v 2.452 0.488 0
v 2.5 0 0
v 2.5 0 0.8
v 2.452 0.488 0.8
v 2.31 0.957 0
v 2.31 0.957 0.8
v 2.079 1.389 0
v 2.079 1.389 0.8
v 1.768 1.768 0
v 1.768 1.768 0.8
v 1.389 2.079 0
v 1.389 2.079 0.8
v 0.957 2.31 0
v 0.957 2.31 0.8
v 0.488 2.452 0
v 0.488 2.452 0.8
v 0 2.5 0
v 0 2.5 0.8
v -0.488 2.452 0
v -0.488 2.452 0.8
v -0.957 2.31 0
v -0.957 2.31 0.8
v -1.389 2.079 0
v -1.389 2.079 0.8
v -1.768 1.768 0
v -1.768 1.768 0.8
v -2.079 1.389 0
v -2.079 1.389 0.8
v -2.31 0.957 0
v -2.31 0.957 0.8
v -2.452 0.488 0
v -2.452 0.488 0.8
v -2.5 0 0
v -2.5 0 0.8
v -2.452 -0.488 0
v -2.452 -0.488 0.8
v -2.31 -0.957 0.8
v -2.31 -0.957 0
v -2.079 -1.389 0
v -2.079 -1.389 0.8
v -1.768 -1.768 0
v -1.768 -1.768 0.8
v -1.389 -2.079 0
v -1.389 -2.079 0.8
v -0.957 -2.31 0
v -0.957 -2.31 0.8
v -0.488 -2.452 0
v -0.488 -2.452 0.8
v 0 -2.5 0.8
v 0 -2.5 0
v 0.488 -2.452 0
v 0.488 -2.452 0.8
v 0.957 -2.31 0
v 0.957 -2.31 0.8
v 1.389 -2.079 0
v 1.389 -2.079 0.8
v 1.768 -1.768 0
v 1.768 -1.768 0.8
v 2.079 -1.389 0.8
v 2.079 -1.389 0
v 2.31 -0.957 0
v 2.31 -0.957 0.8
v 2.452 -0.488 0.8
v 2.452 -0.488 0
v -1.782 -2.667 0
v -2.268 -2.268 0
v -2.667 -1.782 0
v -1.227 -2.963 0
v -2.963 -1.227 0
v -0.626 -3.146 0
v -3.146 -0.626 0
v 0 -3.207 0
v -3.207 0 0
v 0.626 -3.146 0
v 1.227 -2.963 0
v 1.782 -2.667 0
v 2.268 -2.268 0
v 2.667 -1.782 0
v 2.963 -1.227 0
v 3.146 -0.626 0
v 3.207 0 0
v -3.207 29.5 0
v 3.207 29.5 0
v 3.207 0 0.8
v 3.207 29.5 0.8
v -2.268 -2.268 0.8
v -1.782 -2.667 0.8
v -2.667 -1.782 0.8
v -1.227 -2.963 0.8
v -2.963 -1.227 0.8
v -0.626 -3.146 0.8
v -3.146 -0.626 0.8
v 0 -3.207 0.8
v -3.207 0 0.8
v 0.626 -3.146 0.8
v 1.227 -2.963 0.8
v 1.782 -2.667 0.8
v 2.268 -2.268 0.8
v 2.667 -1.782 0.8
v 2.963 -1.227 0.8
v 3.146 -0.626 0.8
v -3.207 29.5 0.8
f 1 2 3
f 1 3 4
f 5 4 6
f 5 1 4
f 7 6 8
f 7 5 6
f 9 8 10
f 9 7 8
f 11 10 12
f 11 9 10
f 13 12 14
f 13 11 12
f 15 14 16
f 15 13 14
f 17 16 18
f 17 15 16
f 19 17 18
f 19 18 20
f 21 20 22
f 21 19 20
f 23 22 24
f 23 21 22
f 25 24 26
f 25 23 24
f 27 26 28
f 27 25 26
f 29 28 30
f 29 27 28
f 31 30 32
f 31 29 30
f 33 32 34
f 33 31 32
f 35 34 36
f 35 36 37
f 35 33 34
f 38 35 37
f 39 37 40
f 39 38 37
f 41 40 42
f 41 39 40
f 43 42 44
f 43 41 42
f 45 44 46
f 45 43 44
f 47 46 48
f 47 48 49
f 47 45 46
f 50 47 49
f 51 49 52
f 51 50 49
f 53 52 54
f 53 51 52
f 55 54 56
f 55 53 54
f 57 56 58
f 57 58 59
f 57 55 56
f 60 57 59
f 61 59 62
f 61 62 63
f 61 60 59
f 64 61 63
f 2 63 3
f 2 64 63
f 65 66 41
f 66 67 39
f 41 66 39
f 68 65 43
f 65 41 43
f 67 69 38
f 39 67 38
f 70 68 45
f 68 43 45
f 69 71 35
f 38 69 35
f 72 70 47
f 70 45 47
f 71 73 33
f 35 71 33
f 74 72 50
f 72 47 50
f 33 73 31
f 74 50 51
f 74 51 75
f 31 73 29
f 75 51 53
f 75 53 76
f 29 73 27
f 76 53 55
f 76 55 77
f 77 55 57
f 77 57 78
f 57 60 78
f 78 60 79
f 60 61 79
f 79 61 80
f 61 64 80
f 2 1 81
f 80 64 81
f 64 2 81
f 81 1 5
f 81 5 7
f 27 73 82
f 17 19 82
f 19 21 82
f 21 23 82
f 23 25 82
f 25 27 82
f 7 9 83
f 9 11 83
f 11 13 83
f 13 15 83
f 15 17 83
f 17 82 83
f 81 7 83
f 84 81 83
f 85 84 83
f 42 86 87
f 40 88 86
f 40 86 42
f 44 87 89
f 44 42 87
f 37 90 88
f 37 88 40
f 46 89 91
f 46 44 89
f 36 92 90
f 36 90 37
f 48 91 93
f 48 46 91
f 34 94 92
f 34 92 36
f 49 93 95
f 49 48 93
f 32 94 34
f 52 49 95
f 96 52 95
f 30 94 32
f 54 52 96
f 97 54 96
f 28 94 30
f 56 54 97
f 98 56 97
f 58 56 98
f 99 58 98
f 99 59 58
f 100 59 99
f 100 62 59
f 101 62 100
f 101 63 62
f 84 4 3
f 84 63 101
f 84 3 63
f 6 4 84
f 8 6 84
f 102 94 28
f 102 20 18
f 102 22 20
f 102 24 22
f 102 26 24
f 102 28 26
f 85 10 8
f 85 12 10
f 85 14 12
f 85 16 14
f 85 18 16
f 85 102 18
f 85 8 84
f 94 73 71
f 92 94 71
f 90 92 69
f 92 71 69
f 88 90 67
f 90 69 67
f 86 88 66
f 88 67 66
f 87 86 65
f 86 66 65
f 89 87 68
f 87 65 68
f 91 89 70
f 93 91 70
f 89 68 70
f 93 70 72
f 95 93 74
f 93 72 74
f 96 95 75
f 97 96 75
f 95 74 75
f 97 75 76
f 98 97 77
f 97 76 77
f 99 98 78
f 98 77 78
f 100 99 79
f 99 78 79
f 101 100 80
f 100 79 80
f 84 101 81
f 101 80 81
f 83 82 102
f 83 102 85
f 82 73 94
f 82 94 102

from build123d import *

# Parameters (mm, degrees)
SKETCH_R  = 2.5
PAD_DEPTH = 0.8


with BuildPart() as part:
    # Sketch → Pad (new body)
    with BuildSketch(Plane.XY):
        with BuildLine():
            ThreePointArc((-3.20733, 0), (0, -3.20733), (3.20733, 0))
            Line((3.20733, 0), (3.20733, 29.5))
            Line((-3.20733, 29.5), (3.20733, 29.5))
            Line((-3.20733, 0), (-3.20733, 29.5))
        make_face()
        Circle(SKETCH_R, mode=Mode.SUBTRACT)
    extrude(amount=PAD_DEPTH)


solid = part.part
